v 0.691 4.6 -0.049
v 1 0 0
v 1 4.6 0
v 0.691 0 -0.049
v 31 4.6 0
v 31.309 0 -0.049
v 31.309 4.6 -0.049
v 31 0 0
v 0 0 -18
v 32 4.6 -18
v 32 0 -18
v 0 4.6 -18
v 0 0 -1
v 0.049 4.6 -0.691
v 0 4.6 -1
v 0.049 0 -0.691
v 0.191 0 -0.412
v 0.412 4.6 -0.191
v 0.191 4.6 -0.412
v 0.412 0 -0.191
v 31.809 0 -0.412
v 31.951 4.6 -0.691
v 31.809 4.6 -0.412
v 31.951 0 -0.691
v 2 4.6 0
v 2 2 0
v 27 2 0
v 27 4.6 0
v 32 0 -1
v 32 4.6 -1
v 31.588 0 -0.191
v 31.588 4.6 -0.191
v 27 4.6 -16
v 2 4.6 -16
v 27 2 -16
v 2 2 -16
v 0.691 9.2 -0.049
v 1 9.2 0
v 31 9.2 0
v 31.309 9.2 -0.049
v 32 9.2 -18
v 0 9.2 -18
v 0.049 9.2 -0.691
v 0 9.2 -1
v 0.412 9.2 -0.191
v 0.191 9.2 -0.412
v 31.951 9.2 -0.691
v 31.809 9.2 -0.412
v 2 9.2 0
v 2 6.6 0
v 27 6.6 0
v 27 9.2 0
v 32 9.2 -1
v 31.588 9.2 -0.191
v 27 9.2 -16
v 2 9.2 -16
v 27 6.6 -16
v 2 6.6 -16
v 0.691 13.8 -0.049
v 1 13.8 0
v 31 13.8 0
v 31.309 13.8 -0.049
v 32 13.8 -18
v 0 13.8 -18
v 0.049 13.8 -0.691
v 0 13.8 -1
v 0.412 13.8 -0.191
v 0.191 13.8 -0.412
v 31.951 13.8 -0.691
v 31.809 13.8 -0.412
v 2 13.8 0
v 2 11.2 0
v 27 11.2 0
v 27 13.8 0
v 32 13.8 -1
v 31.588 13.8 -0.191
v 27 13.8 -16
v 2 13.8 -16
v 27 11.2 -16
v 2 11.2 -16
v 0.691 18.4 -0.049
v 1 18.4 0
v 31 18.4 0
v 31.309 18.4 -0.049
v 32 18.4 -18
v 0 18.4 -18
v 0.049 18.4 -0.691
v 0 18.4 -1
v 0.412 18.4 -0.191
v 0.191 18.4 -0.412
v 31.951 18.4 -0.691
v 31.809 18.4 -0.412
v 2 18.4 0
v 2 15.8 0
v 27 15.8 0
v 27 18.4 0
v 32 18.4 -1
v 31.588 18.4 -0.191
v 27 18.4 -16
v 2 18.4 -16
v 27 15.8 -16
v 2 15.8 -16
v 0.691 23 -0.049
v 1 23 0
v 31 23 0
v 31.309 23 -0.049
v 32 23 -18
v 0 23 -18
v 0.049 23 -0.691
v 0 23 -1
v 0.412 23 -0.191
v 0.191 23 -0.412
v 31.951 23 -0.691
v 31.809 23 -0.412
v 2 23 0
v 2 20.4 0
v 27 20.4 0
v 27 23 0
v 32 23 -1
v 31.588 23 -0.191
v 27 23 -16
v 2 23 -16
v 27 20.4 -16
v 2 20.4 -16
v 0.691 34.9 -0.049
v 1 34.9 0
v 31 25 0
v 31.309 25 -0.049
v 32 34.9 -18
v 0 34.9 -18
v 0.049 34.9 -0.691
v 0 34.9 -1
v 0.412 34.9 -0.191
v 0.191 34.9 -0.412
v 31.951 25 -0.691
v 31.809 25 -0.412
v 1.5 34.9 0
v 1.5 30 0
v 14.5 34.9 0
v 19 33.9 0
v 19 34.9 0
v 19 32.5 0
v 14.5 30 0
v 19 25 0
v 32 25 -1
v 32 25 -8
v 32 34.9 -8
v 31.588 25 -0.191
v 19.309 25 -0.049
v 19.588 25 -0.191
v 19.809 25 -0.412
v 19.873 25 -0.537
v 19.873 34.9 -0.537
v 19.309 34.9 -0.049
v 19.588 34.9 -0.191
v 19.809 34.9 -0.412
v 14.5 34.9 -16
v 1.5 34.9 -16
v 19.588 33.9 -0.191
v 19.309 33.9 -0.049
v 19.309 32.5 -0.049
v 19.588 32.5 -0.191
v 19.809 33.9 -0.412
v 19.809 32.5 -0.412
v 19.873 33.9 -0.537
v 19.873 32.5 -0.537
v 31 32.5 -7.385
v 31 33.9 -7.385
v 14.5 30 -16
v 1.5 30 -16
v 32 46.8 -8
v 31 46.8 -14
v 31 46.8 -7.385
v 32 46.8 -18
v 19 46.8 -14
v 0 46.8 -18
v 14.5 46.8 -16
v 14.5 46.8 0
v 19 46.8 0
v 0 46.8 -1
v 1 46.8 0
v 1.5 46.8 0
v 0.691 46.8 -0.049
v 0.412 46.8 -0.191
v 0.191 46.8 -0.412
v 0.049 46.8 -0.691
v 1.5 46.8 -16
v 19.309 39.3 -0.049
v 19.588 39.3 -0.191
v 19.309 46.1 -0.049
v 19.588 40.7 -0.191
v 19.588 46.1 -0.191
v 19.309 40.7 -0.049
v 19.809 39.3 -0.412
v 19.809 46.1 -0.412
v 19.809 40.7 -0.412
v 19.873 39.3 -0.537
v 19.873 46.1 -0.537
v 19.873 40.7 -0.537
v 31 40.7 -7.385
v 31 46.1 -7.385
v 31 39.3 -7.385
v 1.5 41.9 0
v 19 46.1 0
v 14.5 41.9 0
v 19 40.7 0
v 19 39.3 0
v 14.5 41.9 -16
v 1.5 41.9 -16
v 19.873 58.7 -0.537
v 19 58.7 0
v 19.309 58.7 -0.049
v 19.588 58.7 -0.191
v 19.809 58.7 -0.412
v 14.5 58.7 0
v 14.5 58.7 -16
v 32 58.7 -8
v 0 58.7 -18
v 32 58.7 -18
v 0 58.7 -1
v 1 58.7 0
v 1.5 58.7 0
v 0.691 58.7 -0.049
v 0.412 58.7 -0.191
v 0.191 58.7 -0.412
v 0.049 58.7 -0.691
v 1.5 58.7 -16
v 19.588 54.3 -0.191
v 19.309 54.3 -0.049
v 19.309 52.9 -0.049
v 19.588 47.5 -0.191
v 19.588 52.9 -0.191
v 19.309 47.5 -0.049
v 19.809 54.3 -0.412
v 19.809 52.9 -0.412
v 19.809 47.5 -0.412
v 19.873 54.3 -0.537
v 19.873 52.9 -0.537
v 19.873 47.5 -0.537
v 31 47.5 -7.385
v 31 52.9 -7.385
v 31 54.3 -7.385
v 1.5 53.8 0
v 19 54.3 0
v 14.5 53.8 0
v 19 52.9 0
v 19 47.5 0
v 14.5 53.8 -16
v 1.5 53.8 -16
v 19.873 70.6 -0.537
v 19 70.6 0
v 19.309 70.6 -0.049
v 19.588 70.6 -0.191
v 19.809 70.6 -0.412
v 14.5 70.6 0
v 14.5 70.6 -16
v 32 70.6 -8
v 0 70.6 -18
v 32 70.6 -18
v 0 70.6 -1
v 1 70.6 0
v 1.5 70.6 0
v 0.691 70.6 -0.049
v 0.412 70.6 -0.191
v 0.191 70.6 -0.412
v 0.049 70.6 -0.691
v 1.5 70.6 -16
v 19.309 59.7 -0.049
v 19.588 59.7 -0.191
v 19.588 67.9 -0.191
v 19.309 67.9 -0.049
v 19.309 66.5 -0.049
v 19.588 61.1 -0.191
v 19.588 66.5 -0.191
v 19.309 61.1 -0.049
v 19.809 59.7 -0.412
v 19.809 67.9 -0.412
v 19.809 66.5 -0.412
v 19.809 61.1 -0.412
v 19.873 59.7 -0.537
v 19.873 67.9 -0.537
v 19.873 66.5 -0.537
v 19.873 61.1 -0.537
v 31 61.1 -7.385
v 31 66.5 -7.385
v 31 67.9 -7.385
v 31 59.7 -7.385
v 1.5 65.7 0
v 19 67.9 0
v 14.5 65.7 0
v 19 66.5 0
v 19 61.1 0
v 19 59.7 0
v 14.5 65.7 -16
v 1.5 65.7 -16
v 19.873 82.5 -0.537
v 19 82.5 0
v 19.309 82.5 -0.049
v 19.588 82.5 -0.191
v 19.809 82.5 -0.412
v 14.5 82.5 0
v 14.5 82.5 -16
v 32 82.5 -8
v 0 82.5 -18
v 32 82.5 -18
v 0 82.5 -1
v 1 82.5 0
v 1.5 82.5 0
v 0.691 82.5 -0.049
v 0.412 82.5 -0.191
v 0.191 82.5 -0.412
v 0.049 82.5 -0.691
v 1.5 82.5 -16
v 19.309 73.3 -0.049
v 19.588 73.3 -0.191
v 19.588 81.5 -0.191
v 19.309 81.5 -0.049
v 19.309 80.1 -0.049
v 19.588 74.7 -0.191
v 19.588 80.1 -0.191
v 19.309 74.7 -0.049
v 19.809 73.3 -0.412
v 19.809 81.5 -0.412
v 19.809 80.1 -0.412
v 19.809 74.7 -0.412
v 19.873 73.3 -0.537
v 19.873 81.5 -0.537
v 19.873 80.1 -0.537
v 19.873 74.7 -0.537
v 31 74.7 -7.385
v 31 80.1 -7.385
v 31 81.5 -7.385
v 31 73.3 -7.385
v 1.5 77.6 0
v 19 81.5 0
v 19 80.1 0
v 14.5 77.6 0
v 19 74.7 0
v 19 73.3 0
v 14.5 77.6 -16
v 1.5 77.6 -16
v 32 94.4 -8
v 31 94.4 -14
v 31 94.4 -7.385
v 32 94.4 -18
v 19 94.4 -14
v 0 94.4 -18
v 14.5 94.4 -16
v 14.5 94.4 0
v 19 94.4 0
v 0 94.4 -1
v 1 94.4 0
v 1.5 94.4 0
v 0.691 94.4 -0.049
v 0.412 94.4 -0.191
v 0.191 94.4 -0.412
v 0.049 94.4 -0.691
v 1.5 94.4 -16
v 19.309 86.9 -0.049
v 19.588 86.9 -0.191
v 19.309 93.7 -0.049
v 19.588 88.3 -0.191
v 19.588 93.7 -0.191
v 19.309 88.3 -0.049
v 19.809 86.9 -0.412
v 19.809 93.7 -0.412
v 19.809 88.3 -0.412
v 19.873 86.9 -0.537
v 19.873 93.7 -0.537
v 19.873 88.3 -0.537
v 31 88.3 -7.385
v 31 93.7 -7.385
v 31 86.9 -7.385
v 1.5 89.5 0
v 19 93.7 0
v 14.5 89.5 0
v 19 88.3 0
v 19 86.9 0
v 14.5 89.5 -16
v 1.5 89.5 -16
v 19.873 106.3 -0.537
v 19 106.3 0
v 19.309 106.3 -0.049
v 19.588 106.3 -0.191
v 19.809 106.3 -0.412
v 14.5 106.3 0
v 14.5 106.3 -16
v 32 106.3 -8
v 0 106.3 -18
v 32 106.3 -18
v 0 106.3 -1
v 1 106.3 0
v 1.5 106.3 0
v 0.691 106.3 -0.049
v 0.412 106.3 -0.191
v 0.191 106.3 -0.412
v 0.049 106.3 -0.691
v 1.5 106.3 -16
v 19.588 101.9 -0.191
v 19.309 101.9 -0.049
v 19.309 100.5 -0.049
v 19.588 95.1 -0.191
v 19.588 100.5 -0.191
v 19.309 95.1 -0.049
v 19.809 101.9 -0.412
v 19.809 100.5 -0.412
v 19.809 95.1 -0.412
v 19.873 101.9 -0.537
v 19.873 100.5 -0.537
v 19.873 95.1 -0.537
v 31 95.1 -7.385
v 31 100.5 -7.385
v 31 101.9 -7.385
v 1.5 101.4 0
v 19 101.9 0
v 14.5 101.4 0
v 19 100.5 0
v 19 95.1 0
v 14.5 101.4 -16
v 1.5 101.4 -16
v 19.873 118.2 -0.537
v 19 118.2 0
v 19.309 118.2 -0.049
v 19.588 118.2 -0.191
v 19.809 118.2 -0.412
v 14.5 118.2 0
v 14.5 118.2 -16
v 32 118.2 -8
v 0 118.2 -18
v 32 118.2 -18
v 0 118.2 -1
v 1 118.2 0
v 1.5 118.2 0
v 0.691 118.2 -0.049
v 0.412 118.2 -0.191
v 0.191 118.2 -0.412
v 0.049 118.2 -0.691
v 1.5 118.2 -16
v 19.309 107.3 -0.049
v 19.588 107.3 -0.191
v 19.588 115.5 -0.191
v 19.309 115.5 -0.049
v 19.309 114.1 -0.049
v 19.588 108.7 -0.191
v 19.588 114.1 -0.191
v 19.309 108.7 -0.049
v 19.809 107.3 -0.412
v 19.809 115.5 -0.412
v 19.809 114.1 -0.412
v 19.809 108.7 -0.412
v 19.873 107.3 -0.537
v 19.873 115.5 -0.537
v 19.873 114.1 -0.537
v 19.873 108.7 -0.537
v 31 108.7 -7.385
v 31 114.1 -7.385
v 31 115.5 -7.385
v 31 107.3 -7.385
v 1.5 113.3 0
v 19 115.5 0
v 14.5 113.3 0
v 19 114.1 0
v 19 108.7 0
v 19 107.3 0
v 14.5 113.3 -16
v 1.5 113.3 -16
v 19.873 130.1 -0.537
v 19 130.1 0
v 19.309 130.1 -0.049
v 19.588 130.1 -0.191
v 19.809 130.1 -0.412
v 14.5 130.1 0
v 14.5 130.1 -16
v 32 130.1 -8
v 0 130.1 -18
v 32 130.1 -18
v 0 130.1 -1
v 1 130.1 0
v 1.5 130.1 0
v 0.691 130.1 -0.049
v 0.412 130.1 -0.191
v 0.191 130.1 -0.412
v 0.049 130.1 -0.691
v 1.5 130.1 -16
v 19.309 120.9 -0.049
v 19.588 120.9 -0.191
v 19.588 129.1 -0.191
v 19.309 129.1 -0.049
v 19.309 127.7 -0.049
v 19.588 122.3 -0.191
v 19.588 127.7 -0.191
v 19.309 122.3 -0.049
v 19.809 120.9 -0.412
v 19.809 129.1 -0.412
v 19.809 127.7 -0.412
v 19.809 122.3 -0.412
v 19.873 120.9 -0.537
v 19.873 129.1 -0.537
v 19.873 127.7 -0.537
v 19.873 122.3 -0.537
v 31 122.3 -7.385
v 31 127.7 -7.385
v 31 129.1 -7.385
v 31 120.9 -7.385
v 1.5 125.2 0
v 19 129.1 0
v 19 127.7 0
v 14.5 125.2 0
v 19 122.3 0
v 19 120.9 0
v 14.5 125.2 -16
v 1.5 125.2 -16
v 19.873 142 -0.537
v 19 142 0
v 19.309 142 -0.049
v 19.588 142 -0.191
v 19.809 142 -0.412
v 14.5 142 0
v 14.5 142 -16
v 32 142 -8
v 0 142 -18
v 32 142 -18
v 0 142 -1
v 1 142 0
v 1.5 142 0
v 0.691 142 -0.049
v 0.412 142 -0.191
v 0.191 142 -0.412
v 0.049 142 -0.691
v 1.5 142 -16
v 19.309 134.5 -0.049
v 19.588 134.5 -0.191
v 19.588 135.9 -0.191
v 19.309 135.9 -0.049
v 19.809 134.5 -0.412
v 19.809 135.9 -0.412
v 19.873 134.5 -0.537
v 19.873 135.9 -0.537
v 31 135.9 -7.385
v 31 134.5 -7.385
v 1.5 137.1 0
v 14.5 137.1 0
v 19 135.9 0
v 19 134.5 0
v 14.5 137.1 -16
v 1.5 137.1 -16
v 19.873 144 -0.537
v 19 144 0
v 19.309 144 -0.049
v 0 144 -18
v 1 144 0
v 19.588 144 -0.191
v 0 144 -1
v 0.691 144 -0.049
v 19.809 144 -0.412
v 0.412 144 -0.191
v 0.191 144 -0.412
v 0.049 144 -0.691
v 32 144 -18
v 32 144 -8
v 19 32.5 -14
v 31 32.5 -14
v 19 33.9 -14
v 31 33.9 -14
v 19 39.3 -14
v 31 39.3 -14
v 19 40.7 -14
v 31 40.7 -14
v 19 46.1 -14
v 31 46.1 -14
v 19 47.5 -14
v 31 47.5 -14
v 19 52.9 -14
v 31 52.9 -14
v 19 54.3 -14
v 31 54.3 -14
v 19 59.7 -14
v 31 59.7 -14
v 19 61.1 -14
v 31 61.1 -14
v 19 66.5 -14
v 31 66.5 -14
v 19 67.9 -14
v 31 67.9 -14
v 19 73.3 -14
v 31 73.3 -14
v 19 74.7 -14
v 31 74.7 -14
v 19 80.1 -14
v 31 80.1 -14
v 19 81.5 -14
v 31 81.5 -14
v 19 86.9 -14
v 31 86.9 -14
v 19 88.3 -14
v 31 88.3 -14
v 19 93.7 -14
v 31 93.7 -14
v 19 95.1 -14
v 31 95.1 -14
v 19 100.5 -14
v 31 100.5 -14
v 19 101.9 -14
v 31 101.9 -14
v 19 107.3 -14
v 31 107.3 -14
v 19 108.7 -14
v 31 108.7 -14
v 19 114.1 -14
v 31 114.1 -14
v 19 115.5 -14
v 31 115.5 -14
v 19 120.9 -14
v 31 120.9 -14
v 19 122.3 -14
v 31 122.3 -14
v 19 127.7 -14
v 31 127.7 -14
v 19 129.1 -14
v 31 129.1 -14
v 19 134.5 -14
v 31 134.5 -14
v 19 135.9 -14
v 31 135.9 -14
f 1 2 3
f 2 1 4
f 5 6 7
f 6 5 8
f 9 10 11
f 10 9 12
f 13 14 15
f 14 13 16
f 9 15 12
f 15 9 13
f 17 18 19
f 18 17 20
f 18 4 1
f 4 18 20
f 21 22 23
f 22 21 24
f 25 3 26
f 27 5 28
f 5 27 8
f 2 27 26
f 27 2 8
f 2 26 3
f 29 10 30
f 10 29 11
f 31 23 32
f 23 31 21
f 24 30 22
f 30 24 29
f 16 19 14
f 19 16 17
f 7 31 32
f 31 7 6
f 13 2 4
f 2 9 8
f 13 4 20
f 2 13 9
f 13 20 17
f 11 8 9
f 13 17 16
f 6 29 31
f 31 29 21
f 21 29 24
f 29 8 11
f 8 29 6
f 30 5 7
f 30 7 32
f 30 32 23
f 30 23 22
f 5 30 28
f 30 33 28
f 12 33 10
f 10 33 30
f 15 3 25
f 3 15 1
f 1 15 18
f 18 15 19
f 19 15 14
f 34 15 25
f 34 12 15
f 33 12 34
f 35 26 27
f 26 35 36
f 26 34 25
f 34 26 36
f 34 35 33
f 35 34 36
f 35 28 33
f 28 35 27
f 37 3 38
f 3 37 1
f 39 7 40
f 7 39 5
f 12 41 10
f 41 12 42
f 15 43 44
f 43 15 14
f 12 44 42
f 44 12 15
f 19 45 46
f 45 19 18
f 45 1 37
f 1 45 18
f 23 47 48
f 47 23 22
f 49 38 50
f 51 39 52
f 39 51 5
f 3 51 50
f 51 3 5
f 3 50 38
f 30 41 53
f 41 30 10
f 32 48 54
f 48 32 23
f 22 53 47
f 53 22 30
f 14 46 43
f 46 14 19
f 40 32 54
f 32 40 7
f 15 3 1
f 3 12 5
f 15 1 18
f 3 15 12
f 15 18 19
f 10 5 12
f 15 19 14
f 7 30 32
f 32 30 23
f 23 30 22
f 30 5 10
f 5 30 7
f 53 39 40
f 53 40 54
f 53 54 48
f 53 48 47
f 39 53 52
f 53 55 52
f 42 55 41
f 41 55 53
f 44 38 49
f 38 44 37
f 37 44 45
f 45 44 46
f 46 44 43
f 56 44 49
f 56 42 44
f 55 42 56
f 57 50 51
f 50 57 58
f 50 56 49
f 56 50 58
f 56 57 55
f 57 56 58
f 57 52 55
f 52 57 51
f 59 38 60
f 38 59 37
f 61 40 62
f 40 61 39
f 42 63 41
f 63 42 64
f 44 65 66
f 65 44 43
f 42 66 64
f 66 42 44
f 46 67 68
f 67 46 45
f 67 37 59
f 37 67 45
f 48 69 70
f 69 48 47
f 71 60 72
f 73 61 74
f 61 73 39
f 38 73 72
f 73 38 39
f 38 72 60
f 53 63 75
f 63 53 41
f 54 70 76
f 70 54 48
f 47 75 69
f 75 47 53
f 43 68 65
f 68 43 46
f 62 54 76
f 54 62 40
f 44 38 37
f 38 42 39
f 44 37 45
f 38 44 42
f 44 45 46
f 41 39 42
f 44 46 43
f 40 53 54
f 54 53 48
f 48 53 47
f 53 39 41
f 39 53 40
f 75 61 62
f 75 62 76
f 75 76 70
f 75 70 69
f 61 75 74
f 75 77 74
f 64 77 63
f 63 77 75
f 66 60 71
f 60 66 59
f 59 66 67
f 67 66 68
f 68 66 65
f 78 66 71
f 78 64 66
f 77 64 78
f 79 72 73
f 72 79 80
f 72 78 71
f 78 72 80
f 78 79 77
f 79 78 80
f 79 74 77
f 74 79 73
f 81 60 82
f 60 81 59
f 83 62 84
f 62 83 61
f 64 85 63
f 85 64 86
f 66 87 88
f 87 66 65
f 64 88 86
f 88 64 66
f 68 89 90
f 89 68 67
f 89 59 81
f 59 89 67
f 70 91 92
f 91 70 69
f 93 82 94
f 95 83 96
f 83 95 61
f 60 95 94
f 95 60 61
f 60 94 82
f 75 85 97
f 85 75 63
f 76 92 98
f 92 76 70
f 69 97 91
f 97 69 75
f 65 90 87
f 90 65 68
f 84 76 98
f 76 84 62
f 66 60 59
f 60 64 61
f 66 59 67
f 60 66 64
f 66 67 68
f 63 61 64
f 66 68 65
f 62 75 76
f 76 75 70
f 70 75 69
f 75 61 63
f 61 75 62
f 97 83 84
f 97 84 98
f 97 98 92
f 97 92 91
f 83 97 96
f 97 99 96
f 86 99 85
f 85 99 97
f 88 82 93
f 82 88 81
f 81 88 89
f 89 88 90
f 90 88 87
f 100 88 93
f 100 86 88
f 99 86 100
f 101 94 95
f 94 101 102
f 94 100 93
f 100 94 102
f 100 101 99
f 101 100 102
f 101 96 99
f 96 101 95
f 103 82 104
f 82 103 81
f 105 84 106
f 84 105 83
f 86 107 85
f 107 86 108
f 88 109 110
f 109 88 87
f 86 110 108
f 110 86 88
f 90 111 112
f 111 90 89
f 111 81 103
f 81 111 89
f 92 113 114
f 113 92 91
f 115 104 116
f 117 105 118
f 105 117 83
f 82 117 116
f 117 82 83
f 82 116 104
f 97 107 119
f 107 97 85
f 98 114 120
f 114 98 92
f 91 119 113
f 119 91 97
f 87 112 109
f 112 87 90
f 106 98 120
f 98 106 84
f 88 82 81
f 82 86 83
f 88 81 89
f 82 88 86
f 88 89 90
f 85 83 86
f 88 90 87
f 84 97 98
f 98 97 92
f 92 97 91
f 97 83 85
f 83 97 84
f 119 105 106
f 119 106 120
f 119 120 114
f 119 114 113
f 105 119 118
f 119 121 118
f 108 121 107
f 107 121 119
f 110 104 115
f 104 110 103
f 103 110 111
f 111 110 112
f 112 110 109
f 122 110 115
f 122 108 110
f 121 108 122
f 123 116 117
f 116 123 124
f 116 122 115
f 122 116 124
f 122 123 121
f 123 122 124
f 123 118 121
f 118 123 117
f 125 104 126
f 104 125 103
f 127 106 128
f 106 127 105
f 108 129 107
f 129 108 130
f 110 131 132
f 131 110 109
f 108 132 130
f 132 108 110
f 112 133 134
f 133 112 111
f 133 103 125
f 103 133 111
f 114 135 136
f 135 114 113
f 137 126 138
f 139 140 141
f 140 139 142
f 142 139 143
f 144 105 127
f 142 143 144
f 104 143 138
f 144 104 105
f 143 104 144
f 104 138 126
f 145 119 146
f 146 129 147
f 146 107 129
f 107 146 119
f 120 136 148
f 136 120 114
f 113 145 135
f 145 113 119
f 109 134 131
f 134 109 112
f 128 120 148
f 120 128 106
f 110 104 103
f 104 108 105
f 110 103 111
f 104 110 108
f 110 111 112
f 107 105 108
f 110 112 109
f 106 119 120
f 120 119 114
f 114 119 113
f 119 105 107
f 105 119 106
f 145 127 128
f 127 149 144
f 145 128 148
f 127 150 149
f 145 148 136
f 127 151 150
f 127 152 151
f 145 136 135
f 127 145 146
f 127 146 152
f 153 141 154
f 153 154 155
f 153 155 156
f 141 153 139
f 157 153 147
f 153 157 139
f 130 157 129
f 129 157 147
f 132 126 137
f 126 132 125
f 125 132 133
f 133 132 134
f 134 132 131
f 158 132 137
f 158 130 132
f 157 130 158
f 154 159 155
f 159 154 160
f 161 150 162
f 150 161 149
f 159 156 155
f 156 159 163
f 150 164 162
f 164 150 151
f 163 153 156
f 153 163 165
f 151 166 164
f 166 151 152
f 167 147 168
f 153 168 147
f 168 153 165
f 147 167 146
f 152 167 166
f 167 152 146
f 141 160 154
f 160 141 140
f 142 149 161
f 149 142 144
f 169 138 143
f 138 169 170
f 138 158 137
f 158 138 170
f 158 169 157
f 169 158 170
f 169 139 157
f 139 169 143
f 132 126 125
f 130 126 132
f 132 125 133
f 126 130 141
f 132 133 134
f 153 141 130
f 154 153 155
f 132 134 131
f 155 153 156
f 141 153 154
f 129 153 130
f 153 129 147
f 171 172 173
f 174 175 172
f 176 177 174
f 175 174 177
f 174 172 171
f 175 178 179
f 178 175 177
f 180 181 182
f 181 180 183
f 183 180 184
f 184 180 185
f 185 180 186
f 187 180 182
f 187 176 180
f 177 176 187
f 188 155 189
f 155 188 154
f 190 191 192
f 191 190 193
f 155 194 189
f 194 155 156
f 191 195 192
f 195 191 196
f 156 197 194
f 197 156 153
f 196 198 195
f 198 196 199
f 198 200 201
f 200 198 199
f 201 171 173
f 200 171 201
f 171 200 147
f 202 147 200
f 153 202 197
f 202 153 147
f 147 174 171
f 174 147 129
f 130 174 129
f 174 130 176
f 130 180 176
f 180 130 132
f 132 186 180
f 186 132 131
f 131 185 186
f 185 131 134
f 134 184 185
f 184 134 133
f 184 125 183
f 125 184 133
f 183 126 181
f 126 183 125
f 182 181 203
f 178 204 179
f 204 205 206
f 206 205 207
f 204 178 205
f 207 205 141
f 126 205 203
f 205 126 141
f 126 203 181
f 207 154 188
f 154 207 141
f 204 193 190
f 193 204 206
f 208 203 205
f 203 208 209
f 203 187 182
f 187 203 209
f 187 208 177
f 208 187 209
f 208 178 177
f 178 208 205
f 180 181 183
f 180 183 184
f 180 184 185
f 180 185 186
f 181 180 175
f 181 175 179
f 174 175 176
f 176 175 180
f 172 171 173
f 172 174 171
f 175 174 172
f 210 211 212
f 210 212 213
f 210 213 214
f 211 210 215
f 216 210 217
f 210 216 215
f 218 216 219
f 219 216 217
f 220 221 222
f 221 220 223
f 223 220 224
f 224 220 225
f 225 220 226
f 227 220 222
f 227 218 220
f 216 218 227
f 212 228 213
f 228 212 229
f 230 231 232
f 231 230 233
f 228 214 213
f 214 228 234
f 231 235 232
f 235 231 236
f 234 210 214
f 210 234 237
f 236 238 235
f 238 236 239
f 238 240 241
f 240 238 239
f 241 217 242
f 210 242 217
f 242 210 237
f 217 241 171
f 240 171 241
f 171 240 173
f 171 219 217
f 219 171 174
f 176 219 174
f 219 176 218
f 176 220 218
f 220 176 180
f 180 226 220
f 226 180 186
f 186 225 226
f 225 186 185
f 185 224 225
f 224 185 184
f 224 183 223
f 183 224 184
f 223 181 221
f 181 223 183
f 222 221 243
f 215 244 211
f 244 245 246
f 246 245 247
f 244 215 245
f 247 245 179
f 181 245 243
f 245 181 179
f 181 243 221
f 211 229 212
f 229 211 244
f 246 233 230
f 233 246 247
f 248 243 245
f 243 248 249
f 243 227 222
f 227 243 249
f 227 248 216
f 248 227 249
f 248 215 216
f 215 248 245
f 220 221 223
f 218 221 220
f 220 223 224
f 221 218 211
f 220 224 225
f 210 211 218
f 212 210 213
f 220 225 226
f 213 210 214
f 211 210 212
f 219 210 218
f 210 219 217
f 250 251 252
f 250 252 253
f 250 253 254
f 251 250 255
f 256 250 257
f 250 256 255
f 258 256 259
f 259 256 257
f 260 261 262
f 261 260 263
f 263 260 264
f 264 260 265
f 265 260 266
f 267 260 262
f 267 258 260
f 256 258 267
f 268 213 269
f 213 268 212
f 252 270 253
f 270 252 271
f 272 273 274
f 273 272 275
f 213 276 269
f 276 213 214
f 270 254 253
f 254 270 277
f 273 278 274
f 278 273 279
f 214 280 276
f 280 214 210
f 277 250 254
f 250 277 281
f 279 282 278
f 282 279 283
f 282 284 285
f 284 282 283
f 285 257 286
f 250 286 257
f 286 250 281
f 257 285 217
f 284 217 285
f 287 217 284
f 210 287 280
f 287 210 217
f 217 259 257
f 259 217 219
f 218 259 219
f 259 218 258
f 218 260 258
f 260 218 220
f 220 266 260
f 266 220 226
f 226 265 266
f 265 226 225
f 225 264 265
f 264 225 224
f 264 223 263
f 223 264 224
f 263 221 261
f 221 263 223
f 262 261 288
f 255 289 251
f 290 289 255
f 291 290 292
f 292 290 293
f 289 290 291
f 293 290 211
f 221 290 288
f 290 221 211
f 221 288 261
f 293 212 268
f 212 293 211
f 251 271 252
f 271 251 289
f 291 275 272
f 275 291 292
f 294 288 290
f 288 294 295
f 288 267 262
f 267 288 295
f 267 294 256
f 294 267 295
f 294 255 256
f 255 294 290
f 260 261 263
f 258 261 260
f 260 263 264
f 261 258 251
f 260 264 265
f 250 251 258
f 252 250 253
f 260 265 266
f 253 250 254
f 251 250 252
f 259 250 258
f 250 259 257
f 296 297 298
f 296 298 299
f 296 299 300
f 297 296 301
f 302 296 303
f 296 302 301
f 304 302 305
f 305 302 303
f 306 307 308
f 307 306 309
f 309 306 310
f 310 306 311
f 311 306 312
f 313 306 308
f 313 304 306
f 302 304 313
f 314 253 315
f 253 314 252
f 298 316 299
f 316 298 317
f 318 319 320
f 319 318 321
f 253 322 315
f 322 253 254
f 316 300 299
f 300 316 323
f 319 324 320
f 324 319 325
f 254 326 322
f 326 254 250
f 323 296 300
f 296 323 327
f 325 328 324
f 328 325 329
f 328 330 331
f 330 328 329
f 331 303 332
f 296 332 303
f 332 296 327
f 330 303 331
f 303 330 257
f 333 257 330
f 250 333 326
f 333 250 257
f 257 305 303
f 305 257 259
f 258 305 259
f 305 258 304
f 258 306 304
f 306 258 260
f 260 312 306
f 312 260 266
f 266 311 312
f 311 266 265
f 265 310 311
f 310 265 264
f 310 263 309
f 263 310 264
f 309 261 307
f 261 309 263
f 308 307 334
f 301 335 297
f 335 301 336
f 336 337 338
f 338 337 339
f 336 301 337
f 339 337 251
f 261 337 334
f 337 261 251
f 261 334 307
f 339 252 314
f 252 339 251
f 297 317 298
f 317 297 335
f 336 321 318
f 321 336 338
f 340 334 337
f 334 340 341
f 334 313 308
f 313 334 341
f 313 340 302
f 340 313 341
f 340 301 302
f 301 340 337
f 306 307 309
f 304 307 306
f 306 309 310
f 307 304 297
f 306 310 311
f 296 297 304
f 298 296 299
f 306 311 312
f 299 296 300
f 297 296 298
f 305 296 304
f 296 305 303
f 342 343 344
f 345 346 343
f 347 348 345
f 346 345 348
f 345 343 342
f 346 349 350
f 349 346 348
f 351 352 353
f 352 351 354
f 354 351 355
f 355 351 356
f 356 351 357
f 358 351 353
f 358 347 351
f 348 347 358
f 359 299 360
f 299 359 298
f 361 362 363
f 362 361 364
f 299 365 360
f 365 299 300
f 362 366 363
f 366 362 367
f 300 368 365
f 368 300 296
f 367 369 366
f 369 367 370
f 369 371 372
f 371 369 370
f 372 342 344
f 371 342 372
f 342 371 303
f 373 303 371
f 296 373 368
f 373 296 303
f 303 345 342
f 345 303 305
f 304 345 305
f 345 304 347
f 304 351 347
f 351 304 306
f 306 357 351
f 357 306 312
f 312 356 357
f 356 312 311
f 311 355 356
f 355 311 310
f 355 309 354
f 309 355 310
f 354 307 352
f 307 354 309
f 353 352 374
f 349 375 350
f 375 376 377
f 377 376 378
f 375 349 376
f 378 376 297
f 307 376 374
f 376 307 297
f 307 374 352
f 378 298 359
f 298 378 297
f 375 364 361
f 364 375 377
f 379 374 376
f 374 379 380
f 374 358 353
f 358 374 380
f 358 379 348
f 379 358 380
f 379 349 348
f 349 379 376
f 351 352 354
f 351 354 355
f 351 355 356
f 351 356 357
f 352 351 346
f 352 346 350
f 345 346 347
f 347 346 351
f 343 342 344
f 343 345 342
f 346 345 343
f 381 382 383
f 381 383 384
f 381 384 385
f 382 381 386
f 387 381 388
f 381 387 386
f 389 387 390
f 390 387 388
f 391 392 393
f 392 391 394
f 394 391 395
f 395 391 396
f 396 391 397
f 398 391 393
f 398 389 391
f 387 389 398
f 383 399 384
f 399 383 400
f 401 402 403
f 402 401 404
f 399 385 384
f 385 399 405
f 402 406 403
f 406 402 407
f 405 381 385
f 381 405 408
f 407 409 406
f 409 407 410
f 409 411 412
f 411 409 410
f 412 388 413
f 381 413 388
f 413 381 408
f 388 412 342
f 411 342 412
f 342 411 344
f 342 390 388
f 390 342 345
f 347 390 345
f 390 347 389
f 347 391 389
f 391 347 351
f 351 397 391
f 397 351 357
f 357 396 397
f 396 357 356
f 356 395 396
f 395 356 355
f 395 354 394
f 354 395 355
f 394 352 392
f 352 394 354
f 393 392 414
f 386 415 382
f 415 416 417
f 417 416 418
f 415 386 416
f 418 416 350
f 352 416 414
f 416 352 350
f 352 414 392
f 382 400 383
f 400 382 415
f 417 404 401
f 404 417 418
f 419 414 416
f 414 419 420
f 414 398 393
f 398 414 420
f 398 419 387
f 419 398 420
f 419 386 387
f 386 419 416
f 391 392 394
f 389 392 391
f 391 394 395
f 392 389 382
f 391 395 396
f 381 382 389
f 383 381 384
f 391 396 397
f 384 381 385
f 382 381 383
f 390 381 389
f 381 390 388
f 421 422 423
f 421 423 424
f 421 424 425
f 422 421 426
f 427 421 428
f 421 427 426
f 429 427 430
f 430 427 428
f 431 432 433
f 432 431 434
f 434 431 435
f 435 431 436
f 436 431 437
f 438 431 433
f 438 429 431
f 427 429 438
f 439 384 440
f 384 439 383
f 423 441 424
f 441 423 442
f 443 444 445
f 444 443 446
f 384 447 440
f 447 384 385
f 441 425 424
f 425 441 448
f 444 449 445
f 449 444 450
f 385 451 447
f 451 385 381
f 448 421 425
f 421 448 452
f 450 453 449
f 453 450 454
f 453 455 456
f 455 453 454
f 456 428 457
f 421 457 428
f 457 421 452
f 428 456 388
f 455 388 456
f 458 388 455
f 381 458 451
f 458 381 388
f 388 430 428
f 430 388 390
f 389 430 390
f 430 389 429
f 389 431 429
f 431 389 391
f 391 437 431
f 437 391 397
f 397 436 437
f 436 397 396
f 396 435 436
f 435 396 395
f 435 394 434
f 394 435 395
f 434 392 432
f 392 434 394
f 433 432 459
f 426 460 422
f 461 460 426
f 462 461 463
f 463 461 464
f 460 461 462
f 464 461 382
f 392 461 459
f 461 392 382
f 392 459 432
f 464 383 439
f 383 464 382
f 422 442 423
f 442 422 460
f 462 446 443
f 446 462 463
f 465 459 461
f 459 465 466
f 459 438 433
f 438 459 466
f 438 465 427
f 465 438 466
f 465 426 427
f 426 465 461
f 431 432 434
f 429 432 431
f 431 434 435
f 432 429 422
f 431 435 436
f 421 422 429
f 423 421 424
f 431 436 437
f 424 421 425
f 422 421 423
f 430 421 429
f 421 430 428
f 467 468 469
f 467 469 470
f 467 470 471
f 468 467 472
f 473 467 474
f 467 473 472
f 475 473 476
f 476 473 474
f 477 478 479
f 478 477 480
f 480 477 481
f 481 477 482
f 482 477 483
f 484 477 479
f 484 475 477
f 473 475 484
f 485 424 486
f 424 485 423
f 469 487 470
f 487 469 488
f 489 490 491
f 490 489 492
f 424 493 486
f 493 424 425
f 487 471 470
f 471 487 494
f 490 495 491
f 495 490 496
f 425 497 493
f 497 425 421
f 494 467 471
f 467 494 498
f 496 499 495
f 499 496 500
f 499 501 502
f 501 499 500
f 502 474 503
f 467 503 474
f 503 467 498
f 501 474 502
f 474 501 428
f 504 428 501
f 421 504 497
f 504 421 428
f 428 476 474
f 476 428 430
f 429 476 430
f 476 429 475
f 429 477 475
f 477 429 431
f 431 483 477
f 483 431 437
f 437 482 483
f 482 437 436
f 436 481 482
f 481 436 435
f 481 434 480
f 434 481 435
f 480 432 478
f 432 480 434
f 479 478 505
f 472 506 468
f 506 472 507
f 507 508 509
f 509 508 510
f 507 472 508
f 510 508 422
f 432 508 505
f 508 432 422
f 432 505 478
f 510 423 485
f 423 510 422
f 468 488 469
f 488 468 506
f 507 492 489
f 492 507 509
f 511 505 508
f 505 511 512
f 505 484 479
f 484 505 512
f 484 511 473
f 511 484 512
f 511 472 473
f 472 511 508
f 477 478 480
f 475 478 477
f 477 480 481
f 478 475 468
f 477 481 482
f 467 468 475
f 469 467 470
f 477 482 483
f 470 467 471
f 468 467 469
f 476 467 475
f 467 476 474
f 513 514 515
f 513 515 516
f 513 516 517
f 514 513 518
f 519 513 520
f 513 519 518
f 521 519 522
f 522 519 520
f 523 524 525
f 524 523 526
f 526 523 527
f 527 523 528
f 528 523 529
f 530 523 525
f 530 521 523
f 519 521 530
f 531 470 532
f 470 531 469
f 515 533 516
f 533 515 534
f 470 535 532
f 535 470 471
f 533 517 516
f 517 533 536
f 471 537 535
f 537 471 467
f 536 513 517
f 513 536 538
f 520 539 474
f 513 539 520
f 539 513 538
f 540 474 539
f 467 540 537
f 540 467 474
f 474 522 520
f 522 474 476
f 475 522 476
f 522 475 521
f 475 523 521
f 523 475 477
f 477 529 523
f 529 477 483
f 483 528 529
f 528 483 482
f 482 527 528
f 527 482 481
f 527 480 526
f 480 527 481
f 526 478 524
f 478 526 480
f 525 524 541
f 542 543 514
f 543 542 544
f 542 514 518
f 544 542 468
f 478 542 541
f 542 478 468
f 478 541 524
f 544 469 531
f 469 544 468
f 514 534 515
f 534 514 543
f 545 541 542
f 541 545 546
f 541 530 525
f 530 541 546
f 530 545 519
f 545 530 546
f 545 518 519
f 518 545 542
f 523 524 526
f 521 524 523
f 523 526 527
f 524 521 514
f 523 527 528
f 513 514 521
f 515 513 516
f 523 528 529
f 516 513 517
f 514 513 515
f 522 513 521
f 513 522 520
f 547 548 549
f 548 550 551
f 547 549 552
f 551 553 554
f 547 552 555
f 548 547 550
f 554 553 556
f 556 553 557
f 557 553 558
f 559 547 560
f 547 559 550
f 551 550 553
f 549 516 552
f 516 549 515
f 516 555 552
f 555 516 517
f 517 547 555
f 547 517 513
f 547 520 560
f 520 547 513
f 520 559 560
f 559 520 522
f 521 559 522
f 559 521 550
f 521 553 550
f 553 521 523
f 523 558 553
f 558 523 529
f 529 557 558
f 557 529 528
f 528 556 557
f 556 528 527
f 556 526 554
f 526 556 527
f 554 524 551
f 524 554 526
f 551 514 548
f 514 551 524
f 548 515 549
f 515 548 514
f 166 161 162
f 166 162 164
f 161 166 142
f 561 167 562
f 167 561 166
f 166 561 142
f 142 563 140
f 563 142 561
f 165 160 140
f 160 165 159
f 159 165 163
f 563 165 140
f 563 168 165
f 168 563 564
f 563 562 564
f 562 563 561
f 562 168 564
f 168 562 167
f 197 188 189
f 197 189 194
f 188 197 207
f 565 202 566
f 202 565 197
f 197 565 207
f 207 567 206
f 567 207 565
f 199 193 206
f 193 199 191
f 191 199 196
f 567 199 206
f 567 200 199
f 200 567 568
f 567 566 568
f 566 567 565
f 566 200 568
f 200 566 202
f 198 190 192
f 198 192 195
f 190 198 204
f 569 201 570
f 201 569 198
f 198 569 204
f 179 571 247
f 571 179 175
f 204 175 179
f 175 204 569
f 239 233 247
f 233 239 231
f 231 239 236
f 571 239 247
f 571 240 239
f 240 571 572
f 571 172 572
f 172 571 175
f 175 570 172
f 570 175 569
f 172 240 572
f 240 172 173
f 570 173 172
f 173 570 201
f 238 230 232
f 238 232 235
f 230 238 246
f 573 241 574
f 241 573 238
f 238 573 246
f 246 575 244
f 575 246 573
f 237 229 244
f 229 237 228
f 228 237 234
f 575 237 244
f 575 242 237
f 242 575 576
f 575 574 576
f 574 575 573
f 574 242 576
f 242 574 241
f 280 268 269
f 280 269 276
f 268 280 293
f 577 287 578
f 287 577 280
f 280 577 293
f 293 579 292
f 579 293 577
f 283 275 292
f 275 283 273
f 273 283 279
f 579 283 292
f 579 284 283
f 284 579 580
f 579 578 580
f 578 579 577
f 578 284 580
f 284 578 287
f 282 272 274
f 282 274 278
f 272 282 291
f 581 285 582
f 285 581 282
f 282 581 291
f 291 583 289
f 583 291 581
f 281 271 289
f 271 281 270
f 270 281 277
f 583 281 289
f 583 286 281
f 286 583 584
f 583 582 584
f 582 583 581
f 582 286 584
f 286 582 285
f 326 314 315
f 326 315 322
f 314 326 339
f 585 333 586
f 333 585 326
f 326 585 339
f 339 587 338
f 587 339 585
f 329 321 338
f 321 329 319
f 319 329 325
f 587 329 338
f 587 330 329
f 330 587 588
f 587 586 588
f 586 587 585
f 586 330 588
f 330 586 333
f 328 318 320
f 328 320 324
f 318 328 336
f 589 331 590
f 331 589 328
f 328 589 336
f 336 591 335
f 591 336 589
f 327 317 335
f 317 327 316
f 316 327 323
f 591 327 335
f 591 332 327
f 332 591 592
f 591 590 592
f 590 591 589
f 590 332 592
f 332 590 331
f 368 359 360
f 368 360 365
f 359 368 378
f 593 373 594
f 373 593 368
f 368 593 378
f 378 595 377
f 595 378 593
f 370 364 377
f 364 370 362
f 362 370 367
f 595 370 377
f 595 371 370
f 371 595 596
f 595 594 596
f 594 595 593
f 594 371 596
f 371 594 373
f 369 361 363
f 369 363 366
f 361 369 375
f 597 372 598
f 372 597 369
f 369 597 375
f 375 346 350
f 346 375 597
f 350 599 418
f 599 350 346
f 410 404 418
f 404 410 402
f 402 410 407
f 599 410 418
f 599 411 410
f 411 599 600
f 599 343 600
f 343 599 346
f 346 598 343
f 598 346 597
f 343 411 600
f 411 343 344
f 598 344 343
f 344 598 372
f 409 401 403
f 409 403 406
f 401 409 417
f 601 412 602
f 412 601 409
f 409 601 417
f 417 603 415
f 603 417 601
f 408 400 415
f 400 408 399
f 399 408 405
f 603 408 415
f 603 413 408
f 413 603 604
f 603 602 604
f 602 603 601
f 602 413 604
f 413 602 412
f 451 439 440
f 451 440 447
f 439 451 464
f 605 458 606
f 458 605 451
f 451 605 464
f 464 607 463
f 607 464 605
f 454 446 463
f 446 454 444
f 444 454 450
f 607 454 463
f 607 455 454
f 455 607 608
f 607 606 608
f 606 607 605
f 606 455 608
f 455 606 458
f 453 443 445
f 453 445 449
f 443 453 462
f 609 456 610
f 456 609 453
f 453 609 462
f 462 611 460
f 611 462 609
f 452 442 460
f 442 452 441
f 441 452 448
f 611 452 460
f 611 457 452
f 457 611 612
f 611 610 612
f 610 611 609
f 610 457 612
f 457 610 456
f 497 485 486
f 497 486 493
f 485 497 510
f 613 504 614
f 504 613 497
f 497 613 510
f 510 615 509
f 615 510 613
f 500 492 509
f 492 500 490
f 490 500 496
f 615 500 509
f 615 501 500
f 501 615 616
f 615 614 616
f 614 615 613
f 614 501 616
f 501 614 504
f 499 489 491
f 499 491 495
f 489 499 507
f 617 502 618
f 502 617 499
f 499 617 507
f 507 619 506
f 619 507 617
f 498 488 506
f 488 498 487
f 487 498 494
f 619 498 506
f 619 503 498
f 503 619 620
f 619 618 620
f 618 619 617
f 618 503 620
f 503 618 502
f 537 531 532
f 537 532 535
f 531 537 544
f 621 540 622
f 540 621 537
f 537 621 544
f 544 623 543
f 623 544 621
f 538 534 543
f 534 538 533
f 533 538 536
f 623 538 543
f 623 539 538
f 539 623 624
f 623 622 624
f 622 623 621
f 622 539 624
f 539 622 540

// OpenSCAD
// 
// (c) g3org 

//Count of SD Slots
    count_SD = 5;
//SD Card thickness
    SD_thickness=2.6;

//Count of SD Slots
    count_USB = 10;
//USB Slot thickness
    USB_thickness =4.9;
//Space between USB Slots
    USB_space = 7;

//Count micro SD 
    count_microSD =16;
//micro SD thickness
    microSD_thickness =1.4;
    microSD_space = 5.4;


//Full_Render


/* [Hidden] */
$fn=20;

//inputs end

rotate([-90,0]) {  
    SD_Card_render();
        difference() {
            USB_Slot();
            microSD();
        }
}



module microSD(){
    
    
     //micro SD_slot
    for (i = [ 0 : count_microSD-1 ] ) {
    
            translate([19,0,((count_SD*(SD_thickness+2.5))+USB_space)+(i*(microSD_thickness+microSD_space))]){
                linear_extrude(height = microSD_thickness, center = false, convexity = 10) {
                square([12,14]);
                }
            }
    }
}
module USB_Slot(){
    
  translate([0,0,count_SD*(SD_thickness+2)]){
   for (i = [ 0-1 : count_USB-2 ] ) {    
       
    translate([0,0,i*(USB_space+USB_thickness) ]){
        echo(i,i*(USB_space+USB_thickness));  
        difference() {
            // Block plus Rundung
            linear_extrude(height = USB_thickness+USB_space, center = false, convexity = 10) {
            translate([19,1,0,])  circle(1);
                translate([1,1,0,])  circle(1);
                polygon([[1,0],[19,0],[32,8],[32,18],[0,18],[0,1]],[[0,1,2,3,4,5]]);
           }
 //USB_slot_Schlitz
            translate([1.5,-3,USB_space]){
                linear_extrude(height = USB_thickness, center = false, convexity = 10) {
                square([13,19]);
                }
            }
  //Bodendurchbruch          
             *translate([5,1,USB_space,]){
                linear_extrude(height = USB_thickness, center = false, convexity = 10) {
                square([6,19]);
                }
            } 
        } 
    } 
    i = i+1; 
  } 
  
  //Abschlussplatte_USB_Slots
      translate([0,0,count_USB*(USB_thickness+USB_space)]){
          linear_extrude(height = 2, center = false, convexity = 10) {
                translate([19,1,0,])  circle(1);
                translate([1,1,0,])  circle(1);
                polygon([[1,0],[19,0],[32,8],[32,18],[0,18],[0,1]],[[0,1,2,3,4,5]]);
            }
       } 
    }
}


module SD_Card_render(){
    
  for (i = [ 0 : count_SD-1 ] ) {    
    translate([0,0,i*(SD_thickness+2)-(SD_thickness+2)]){
        difference() {
            // Block plus Rundung
            linear_extrude(height = SD_thickness+2, center = false, convexity = 10) {
                translate([1,0,0,])   square([30,17]);
                translate([0,1,0,])  square([32,17]);
                translate([31,1,0,])  circle(1);
                translate([1,1,0,])  circle(1);
            }
  //SD_slot_Schlitz
            translate([2,-3,2,]){
                linear_extrude(height = SD_thickness, center = false, convexity = 10) {
                square([25,19]);
                }
            }
  //Bodendurchbruch          
            *translate([7.7,1,2,]){
                linear_extrude(height = SD_thickness, center = false, convexity = 10) {
                square([14,19]);
                }
            }
        }
    }
    i = i+1;
  }
  //Abschlussplatte_SD_Cars Slots
      translate([0,0,count_SD*(SD_thickness+2)]){
          linear_extrude(height = 2, center = false, convexity = 10) {
                translate([1,0,0,])   square([30,17]);
                translate([0,1,0,])  square([32,17]);
                translate([31,1,0,])  circle(1);
                translate([1,1,0,])  circle(1);
            }
        }
}
